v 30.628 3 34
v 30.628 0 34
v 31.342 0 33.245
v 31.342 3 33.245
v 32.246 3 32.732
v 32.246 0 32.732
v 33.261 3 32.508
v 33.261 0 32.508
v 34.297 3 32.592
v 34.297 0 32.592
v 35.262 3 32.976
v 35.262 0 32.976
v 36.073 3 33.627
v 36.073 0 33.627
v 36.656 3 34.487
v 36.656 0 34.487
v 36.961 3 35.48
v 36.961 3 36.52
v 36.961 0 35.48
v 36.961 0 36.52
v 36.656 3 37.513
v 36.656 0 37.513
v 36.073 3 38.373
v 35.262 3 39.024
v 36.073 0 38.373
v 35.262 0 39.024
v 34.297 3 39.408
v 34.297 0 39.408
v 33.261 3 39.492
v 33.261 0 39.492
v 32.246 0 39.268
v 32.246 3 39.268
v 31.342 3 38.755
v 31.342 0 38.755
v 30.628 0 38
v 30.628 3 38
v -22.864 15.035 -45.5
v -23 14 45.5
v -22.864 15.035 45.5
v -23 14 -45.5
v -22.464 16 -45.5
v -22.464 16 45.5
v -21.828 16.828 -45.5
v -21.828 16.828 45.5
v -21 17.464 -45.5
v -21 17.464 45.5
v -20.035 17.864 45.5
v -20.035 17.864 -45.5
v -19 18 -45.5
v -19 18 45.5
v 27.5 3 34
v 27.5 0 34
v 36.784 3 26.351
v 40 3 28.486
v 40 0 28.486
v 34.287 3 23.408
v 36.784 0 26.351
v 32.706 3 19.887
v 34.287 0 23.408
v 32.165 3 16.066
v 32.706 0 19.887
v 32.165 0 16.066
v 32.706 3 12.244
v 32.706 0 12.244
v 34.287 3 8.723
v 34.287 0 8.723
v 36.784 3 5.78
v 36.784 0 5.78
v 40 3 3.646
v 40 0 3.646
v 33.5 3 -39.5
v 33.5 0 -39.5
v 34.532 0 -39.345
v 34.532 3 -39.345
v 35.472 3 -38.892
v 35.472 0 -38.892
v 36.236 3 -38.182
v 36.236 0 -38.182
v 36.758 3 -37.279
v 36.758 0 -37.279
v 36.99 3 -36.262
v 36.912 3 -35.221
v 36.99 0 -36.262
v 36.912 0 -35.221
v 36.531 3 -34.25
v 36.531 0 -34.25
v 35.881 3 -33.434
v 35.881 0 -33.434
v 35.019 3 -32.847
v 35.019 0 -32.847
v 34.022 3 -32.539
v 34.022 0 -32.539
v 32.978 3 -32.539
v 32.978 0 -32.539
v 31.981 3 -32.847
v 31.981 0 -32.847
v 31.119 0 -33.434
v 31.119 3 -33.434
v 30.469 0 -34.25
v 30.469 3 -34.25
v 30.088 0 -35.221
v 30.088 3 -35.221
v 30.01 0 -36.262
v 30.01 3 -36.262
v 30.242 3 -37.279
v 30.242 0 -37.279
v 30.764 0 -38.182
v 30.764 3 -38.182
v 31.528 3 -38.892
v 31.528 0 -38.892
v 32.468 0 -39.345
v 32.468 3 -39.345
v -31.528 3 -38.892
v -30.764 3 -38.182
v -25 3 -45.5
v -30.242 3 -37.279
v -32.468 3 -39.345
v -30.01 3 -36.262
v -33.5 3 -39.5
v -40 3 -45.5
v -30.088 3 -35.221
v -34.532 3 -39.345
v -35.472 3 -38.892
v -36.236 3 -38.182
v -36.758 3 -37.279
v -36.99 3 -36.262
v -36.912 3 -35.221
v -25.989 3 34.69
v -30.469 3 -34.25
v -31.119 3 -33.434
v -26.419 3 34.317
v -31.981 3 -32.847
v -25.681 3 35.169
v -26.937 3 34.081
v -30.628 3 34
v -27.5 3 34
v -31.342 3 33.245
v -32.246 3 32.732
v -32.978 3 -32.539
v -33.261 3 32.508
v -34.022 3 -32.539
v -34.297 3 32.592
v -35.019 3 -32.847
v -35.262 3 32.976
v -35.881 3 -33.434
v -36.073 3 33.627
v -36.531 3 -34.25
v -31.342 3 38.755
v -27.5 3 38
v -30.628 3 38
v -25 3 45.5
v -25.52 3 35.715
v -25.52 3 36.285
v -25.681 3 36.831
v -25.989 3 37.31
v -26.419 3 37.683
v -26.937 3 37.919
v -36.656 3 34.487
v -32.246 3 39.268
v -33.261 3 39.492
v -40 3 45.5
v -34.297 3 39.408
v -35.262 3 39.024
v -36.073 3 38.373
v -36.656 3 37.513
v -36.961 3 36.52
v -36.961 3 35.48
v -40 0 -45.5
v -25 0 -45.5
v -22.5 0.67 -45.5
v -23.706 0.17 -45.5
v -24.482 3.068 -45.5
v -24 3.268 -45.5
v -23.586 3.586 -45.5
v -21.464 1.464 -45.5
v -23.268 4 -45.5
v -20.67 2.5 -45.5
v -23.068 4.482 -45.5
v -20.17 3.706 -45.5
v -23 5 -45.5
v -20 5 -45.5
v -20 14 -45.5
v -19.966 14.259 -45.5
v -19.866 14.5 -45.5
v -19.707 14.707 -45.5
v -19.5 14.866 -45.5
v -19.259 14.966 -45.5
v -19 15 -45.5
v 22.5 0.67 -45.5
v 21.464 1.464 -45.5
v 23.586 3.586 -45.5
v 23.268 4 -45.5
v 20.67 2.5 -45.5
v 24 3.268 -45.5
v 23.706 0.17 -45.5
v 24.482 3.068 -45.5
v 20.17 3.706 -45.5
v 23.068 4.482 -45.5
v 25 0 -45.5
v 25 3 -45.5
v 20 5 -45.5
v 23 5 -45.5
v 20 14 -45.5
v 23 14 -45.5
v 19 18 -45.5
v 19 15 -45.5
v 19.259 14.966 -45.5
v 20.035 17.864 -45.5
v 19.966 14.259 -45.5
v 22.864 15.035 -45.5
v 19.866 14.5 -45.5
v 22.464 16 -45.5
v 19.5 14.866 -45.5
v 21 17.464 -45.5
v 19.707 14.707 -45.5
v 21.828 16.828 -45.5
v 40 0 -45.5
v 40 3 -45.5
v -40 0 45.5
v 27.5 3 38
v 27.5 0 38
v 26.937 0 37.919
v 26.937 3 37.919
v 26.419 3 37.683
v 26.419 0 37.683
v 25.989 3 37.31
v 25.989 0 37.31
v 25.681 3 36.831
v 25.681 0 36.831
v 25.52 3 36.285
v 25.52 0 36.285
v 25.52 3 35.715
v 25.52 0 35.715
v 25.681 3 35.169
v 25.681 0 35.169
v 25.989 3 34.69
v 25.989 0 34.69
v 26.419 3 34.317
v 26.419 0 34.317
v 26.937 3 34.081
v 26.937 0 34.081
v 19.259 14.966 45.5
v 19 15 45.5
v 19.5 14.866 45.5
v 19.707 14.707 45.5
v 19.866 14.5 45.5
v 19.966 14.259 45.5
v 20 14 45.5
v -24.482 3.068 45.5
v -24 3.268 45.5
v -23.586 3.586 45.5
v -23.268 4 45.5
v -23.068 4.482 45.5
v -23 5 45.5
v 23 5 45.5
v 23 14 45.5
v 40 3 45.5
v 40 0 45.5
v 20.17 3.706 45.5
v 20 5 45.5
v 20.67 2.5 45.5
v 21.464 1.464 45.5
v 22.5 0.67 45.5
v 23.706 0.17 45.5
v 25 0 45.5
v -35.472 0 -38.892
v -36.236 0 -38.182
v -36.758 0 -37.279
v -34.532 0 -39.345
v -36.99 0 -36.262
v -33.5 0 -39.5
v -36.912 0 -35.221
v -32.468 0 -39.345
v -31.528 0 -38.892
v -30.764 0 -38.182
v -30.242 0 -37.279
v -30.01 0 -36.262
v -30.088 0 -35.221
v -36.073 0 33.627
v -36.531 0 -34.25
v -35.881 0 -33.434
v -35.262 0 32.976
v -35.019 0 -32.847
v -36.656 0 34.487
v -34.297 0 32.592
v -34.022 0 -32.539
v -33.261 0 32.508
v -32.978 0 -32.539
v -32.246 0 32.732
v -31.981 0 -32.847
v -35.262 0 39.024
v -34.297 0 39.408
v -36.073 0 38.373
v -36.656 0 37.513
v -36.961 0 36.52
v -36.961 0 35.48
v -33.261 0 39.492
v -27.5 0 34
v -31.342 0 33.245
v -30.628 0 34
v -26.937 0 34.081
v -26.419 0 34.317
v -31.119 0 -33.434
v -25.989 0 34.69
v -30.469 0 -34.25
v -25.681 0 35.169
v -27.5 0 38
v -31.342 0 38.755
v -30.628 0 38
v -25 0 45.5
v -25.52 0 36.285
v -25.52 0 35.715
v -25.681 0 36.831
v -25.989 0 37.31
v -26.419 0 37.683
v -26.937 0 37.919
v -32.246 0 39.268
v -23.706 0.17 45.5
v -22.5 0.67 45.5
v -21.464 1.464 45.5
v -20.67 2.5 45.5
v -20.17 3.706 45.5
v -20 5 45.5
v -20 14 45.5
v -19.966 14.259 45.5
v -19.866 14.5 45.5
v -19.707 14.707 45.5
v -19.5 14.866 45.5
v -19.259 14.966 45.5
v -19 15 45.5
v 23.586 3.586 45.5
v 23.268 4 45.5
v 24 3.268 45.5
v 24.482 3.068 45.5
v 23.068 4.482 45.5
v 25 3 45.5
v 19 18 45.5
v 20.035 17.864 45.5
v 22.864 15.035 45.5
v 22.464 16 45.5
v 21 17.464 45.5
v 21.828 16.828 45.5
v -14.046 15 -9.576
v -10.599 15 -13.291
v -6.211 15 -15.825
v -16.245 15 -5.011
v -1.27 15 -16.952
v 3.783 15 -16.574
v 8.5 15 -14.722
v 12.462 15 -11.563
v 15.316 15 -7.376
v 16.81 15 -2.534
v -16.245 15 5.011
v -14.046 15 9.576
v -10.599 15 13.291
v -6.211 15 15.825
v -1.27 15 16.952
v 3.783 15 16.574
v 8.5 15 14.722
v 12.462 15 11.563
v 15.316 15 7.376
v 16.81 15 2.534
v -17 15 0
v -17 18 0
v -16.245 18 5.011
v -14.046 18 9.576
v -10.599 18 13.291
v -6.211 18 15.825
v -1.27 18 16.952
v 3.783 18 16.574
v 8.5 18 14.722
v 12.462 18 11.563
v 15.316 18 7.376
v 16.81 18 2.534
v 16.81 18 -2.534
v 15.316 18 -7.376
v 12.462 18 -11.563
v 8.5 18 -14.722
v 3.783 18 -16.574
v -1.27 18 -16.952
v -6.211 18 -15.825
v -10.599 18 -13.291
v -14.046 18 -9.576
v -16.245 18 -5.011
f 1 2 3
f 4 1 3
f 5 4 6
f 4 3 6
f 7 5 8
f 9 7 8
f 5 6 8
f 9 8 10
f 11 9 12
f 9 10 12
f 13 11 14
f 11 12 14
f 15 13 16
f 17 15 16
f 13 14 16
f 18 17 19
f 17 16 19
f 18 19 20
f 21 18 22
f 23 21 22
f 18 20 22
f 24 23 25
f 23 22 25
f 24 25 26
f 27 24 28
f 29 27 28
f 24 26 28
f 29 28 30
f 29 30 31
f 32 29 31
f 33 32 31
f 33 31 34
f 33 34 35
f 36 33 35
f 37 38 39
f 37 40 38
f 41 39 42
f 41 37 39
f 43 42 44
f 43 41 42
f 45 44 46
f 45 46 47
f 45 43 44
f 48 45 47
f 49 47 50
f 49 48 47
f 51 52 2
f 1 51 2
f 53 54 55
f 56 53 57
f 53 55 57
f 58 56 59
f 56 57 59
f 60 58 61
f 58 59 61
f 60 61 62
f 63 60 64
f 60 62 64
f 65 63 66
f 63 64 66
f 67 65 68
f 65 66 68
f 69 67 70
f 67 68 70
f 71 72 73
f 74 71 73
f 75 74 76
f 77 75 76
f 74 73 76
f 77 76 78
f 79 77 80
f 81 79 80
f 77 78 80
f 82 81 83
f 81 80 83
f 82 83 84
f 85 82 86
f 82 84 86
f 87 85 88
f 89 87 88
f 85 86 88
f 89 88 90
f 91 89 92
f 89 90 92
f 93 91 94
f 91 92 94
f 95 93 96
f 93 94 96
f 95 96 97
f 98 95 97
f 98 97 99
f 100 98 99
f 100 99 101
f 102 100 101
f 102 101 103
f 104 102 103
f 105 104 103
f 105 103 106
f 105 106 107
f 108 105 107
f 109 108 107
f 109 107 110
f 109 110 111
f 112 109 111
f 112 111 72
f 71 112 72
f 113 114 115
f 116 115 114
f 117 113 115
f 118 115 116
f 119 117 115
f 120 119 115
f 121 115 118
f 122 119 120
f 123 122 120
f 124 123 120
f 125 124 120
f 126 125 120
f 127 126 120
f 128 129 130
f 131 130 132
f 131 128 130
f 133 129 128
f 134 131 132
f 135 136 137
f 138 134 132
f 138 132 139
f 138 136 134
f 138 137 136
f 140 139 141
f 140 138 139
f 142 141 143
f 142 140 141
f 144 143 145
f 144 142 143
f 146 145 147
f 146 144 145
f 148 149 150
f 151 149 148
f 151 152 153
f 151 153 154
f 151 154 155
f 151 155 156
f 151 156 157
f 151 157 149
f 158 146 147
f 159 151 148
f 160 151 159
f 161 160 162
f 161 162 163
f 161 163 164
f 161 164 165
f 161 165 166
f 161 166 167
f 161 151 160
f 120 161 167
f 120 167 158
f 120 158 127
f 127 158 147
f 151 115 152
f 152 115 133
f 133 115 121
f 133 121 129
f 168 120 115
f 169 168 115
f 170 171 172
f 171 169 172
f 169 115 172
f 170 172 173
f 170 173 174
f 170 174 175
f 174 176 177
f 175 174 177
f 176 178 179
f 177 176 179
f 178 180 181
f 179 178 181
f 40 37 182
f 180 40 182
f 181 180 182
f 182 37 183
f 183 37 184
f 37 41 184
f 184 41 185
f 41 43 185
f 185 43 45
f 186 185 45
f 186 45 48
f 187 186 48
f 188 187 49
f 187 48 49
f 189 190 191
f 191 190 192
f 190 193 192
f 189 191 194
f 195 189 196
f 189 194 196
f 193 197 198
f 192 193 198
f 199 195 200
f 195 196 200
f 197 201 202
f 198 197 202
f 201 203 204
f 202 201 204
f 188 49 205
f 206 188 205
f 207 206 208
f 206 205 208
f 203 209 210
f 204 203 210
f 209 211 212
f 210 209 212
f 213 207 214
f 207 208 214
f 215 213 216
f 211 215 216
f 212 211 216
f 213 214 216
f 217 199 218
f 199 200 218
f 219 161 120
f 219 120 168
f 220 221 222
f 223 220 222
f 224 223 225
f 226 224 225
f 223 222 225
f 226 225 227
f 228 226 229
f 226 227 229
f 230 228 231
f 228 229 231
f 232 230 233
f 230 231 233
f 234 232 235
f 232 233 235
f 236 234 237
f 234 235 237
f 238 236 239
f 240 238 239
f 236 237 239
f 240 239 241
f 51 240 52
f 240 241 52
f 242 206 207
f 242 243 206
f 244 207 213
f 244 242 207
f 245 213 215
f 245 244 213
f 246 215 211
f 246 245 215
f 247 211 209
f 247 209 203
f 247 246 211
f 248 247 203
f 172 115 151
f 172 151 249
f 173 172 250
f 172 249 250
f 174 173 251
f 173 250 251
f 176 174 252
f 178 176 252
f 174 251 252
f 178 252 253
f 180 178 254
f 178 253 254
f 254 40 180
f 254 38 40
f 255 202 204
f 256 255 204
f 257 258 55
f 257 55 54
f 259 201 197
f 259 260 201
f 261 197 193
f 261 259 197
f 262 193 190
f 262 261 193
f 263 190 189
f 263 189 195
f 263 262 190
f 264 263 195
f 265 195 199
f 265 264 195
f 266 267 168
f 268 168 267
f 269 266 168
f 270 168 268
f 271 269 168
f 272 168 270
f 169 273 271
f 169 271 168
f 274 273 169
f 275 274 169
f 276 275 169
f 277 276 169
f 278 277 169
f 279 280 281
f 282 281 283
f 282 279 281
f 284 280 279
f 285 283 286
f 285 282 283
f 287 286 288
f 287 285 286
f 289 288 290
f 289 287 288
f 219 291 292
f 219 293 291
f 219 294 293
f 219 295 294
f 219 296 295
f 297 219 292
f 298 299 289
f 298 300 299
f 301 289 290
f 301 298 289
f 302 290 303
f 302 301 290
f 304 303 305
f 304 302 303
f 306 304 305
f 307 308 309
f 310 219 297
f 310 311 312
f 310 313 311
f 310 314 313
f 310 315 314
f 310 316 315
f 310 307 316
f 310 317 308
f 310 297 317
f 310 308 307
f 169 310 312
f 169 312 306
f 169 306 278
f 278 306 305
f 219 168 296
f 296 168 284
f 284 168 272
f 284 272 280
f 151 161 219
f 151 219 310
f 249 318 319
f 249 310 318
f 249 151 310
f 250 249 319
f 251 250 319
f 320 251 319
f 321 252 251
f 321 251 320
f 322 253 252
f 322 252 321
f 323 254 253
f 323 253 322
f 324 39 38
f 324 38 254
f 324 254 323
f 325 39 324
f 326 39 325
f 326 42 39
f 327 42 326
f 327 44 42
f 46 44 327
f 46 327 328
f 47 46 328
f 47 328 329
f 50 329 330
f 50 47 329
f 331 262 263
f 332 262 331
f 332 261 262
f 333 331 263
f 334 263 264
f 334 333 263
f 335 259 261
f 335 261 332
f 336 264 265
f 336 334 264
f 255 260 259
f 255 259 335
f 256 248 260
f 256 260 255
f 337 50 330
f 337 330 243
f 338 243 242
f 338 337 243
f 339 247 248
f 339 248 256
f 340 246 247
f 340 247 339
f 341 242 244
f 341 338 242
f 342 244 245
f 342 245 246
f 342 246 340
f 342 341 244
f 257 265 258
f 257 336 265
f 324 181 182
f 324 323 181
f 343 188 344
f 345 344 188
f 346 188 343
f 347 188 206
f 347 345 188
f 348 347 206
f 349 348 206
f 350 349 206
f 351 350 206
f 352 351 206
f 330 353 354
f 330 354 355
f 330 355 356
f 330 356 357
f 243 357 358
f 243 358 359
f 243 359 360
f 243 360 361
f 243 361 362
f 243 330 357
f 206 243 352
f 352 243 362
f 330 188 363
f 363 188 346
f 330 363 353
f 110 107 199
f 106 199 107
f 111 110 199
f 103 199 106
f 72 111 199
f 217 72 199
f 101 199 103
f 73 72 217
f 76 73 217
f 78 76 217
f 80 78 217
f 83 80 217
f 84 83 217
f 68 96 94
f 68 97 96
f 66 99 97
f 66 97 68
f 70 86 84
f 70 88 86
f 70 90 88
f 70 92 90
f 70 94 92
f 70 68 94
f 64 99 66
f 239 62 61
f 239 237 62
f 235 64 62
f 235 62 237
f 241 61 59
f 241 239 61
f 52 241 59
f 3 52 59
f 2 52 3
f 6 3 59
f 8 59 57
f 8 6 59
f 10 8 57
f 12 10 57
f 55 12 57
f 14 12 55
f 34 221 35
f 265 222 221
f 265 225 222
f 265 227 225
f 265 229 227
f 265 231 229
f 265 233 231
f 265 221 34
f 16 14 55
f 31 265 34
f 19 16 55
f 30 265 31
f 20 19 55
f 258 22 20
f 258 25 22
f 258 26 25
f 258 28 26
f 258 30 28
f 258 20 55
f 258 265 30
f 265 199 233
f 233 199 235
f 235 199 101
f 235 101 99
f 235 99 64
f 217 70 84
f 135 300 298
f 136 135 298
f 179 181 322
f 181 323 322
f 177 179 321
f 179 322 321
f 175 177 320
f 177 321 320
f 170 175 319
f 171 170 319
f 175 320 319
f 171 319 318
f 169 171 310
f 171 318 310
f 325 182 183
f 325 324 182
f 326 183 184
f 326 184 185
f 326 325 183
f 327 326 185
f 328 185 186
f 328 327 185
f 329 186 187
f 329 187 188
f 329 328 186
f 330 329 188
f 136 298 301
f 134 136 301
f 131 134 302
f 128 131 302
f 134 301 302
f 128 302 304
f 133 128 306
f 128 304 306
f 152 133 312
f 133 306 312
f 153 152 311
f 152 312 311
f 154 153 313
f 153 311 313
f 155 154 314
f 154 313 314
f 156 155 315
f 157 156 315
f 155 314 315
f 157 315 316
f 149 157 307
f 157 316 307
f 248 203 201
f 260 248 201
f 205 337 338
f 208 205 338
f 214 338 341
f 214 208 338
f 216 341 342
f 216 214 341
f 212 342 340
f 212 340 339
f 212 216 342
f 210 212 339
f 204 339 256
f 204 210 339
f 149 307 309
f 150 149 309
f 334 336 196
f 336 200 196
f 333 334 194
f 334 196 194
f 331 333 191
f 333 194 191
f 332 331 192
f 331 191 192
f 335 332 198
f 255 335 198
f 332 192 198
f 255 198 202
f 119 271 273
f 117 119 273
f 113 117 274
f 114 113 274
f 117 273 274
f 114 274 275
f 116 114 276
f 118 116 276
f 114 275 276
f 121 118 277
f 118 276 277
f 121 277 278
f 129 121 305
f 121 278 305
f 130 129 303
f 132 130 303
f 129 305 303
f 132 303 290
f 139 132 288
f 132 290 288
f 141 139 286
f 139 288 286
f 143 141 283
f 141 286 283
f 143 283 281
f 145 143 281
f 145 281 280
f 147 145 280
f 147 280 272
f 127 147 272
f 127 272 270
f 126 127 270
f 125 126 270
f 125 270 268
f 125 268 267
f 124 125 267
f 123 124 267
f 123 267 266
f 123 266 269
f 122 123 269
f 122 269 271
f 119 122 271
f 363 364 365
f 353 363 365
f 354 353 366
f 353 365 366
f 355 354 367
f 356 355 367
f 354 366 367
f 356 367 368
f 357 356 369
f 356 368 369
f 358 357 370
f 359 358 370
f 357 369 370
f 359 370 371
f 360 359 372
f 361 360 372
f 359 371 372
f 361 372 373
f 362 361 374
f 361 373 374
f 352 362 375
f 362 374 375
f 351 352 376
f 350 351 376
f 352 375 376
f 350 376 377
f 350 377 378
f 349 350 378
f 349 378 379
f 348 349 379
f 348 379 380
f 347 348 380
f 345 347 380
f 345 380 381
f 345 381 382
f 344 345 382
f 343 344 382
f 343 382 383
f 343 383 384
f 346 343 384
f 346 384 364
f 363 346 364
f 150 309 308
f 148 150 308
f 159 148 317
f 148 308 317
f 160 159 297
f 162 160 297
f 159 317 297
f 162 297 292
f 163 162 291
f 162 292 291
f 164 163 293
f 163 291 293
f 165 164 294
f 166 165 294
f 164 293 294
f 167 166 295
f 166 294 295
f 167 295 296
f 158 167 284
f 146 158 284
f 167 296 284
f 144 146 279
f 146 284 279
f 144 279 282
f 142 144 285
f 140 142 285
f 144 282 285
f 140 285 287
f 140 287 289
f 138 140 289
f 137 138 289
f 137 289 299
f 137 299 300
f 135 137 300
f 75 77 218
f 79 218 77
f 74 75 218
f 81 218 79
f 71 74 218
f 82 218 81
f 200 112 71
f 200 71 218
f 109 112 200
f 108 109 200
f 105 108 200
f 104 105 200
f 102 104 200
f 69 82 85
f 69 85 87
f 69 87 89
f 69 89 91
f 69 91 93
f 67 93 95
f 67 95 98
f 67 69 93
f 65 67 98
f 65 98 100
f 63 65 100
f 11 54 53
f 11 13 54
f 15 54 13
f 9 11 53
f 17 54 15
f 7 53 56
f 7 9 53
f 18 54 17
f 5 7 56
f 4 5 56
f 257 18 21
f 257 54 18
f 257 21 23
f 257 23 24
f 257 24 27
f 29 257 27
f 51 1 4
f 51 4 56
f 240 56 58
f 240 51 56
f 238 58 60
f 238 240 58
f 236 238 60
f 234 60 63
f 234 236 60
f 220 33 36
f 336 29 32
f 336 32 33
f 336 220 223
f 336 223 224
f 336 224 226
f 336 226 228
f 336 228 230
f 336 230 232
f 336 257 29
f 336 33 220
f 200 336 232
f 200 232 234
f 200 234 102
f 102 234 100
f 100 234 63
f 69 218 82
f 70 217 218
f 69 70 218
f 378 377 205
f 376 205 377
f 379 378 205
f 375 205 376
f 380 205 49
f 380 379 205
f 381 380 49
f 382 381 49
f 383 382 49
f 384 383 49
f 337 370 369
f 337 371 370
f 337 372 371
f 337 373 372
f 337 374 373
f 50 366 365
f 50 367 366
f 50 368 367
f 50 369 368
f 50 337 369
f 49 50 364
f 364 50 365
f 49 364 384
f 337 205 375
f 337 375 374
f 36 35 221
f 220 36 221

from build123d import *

# Parameters (mm, degrees)
EXTRUDE_1_DEPTH     = 45.5
FILLET_1_R          = 4
FILLET_2_R          = 1
FILLET_3_R          = 5
FILLET_4_R          = 2
SKETCH_2_R          = 3.5
CUT_EXTRUDE_1_DEPTH = 10
SKETCH_3_R          = 13.760875338
CUT_EXTRUDE_2_DEPTH = 10
SKETCH_4_R          = 17
CUT_EXTRUDE_3_DEPTH = 10


with BuildPart() as part:
    # 草图1 → 凸台-拉伸1 (new, symmetric)
    with BuildSketch(Plane.XY):
        Polygon((0, 18), (-23, 18), (-23, 3), (-40, 3), (-40, 0), (-20, 0), (-20, 15), (0, 15), (20, 15), (20, 0), (40, 0), (40, 3), (23, 3), (23, 18), align=None)
    extrude(amount=EXTRUDE_1_DEPTH, both=True)

    # 圆角1
    fillet_1_edges = [part.edges().sort_by_distance(p)[0] for p in [
        (-23, 18, 0),
        (23, 18, 0),
    ]]
    fillet(fillet_1_edges, radius=FILLET_1_R)

    # 圆角2
    fillet_2_edges = [part.edges().sort_by_distance(p)[0] for p in [
        (-20, 15, 0),
        (20, 15, 0),
    ]]
    fillet(fillet_2_edges, radius=FILLET_2_R)

    # 圆角3
    fillet_3_edges = [part.edges().sort_by_distance(p)[0] for p in [
        (-20, 0, 0),
        (20, 0, 0),
    ]]
    fillet(fillet_3_edges, radius=FILLET_3_R)

    # 圆角4
    fillet_4_edges = [part.edges().sort_by_distance(p)[0] for p in [
        (-23, 3, 0),
        (23, 3, 0),
    ]]
    fillet(fillet_4_edges, radius=FILLET_4_R)

    # 草图2 → 切除-拉伸1 (cut)
    with BuildSketch(Plane.XZ):
        with Locations(Location((-33.5, -36, 0), (0, 0, 270))):
            Circle(SKETCH_2_R)
        with Locations(Location((33.5, -36, 0), (0, 0, 270))):
            Circle(SKETCH_2_R)
        with BuildLine():
            Line((-27.5, 38), (-30.627718677, 38))
            ThreePointArc((-30.627718677, 38), (-37, 36), (-30.627718677, 34))
            Line((-30.627718677, 34), (-27.5, 34))
            ThreePointArc((-27.5, 34), (-25.5, 36), (-27.5, 38))
        make_face()
        with BuildLine():
            Line((27.5, 34), (30.627718677, 34))
            ThreePointArc((30.627718677, 34), (37, 36), (30.627718677, 38))
            Line((30.627718677, 38), (27.5, 38))
            ThreePointArc((27.5, 38), (25.5, 36), (27.5, 34))
        make_face()
    extrude(amount=-CUT_EXTRUDE_1_DEPTH, mode=Mode.SUBTRACT)

    # 草图3 → 切除-拉伸2 (cut)
    with BuildSketch(Plane.XZ):
        with Locations((45.925407616, 16.065733646)):
            Circle(SKETCH_3_R)
    extrude(amount=-CUT_EXTRUDE_2_DEPTH, mode=Mode.SUBTRACT)

    # 草图4 → 切除-拉伸3 (cut)
    with BuildSketch(Plane(origin=(0, 18, 0), x_dir=(1, 0, 0), z_dir=(0, 1, 0))):
        with Locations(Location((0, 0, 0), (0, 0, 180))):
            Circle(SKETCH_4_R)
    extrude(amount=-CUT_EXTRUDE_3_DEPTH, mode=Mode.SUBTRACT)


solid = part.part
